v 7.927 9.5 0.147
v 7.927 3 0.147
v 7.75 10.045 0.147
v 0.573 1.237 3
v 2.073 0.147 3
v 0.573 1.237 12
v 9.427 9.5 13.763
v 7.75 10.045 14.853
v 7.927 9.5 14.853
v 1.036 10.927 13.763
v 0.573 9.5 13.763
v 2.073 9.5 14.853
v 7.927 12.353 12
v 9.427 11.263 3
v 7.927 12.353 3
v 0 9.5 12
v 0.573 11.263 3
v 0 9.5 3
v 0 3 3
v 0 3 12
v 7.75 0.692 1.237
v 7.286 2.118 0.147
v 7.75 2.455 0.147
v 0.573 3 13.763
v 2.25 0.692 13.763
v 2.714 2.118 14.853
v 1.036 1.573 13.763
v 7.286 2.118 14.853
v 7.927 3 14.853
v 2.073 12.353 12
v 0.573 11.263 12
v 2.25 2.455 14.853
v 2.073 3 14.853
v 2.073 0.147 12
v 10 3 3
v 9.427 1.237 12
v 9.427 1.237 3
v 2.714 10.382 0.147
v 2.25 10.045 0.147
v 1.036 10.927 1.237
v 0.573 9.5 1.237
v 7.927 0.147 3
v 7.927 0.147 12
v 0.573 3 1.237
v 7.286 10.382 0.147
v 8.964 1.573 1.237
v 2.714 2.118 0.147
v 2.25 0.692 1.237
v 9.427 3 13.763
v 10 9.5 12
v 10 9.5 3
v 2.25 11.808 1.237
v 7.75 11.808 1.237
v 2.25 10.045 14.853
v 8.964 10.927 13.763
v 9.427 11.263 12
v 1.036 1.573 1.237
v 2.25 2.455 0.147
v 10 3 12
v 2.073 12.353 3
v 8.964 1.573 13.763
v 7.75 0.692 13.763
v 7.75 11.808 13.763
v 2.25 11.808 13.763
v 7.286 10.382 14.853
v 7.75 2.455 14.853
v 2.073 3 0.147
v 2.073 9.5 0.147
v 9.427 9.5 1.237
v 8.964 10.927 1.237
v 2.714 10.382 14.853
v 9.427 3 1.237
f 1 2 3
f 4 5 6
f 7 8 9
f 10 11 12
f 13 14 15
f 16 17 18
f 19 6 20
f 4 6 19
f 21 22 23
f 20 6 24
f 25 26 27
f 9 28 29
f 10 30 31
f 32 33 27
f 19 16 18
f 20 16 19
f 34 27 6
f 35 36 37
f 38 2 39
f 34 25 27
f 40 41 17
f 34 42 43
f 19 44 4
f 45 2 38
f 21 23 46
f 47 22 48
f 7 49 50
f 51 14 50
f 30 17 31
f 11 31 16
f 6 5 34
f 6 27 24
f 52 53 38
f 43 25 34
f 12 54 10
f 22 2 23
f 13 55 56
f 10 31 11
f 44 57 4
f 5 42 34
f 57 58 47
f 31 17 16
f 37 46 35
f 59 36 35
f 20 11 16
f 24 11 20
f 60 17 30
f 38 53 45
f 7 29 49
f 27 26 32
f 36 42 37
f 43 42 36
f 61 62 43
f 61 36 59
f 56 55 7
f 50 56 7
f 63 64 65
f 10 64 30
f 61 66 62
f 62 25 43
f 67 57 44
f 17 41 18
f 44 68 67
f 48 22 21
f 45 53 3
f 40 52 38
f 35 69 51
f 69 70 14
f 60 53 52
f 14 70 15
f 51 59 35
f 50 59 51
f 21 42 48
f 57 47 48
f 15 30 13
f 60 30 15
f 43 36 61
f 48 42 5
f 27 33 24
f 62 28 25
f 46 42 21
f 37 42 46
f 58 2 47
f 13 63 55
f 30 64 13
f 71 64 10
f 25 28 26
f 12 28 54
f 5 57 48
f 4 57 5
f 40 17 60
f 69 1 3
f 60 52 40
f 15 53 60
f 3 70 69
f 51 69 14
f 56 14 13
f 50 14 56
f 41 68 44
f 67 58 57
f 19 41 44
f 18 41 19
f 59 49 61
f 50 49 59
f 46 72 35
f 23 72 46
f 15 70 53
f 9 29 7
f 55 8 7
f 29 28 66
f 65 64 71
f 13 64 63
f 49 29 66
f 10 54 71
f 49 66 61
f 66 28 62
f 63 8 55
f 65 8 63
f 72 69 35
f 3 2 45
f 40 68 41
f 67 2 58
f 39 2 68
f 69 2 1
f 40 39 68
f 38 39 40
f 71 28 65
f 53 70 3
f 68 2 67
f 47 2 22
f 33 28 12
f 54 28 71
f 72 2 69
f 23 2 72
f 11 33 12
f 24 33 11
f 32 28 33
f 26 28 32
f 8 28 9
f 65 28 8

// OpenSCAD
/**
 * A cuboid with rounded corners
 *
 * https://hackaday.com/2018/02/13/openscad-tieing-it-together-with-hull/
 */
module cuboid(
          size_x,
          size_y,
          size_z,
          curvature_radius
        )
{
  // Generate a closed surface around eight spheres placed the corners of a cuboid
	hull()
	{
    for (x = [curvature_radius, size_x-curvature_radius])
      for (y = [curvature_radius, size_y-curvature_radius])
        for (z = [curvature_radius, size_z-curvature_radius])
          translate([x, y, z])
          sphere(curvature_radius);
	}
}

// Demo cuboid
cuboid(
  size_x = 10,
  size_y = 12.5,
  size_z = 15,
  curvature_radius = 3
);
